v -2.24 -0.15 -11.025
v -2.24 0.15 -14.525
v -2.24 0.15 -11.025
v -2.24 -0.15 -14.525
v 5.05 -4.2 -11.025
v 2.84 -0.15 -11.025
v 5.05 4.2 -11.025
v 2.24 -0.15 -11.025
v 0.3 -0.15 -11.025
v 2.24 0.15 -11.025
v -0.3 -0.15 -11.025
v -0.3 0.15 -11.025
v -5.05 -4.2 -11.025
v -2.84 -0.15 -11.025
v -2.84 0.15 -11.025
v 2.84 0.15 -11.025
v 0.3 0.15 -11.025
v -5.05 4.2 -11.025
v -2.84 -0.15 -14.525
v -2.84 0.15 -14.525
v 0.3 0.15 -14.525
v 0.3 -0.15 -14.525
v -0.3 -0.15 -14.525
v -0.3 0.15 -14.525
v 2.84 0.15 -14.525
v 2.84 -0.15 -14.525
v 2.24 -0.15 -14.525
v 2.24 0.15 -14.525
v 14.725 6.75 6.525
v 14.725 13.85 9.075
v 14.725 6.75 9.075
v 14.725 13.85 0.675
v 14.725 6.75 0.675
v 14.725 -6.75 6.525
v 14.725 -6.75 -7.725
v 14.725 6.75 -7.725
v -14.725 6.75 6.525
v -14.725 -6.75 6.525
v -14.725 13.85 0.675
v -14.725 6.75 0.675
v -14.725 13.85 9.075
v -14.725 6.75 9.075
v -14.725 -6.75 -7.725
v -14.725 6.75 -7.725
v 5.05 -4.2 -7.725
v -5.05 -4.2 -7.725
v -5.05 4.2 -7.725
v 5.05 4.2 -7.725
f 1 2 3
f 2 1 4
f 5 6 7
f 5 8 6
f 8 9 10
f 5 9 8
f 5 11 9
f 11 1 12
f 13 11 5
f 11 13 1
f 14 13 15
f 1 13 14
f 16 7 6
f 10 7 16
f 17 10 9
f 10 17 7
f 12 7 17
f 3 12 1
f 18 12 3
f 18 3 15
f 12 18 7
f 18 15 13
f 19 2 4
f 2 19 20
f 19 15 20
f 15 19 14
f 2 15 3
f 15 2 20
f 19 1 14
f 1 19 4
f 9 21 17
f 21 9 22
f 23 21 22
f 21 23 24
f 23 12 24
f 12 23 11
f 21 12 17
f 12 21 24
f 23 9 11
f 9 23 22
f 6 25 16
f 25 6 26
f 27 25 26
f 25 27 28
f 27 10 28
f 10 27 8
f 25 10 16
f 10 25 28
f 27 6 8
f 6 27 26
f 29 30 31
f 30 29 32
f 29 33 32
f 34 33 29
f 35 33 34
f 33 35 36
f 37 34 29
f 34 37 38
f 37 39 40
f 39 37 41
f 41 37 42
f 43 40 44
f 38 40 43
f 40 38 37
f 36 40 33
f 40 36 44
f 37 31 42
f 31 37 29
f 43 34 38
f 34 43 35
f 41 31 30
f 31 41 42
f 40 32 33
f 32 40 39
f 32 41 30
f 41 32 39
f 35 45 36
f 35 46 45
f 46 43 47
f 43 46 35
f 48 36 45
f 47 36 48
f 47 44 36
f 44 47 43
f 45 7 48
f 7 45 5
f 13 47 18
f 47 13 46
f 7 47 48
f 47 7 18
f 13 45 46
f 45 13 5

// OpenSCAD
// Sharp GP2Y0D413K0F Distance Sensor - Outline Model
// Coordinate system: center of main body at origin, +Z up, +Y toward lens front
// Units: mm

// ─── Key dimensions from datasheet ───────────────────────────────────────────

// Main body (Carbonic ABS case)
body_w = 29.45;   // width  (X)  – overall width shown as 29.45
body_h = 13.05;   // height (Z)  – 13.05 shown on right side view
body_d = 13.5;    // depth  (Y)  – read from bottom view (~13.5 estimated)
// The drawing shows 18.9 as the total height including PWB protrusion area;
// 13.05 is the case body height, 1.2 is PWB thickness, (3.3) connector below.

// PWB (printed wiring board) – sits below the main body
pwb_w  = 29.45;   // same width as body
pwb_d  = 13.5;    // same depth as body
pwb_t  = 1.2;     // thickness  (Z)

// Connector (JCTC 12001W90-3P-HF) – 3-pin, below PWB
// Bottom view shows pin spacing area: 7.5 + 4.15 + ... = widths
// Connector body approx: width 10.1, depth ~8.4, height (3.3)
conn_w = 10.1;
conn_d = 8.4;
conn_h = 3.3;     // (reference)
pin_pitch = 2.54; // standard 2.54 mm pitch for 3 pins
pin_w  = 0.6;
pin_d  = 0.3;
pin_h  = 3.5;     // length protruding below connector

// Lens case protrusion on the front face (+Y)
// From front view: total width 29.45, lens case protrudes forward
// Lens case height: roughly 8.4 (from 8.4 dimension in side view)
// Lens case width: contains both lenses; *4.5 and *19.7 are lens center X positions
//   (measured from left edge of body, so left lens center at x=4.5, right at x=19.7)
// Lens case depth (protrusion): ~7.1 ± 0.1 (from side view dimension 7.1±0.1)
// Lens case vertical center: approximately at 7.2 from bottom of body (side view shows 7.2)
lens_case_w    = 29.45;  // spans full width
lens_case_h    = 8.4;    // height of lens case
lens_case_d    = 7.1;    // protrusion depth beyond front face
lens_case_z_bot = 7.2;   // bottom of lens case above body bottom

// Lens positions (center X from LEFT edge of body)
emitter_cx_from_left  = 4.5;   // *4.5
detector_cx_from_left = 19.7;  // *19.7

// Convert to body-centered X coordinates
// body left edge is at x = -body_w/2
emitter_cx  = -body_w/2 + emitter_cx_from_left;   // = -14.725 + 4.5  = -10.225
detector_cx = -body_w/2 + detector_cx_from_left;  // = -14.725 + 19.7 =  4.975

// Lens center Z (from body bottom)
lens_cz_from_bot = lens_case_z_bot + lens_case_h/2;  // approx middle of lens case

// Emitter lens: circular, diameter ~5.5 (estimated from drawing proportions)
emitter_lens_r = 2.75;

// Detector lens: rectangular window, approx 6.3 wide x 6.3 tall (6.3 from drawing)
detector_lens_w = 6.3;
detector_lens_h = 6.3;

// ─── Derived Z coordinates ────────────────────────────────────────────────────
// Layout from bottom up:
//   connector pins protrude below PWB
//   PWB bottom at z = -body_h/2 - pwb_t
//   body bottom at z = -body_h/2
//   body top    at z = +body_h/2

body_bot_z = -body_h / 2;
body_top_z =  body_h / 2;
pwb_bot_z  = body_bot_z - pwb_t;
conn_bot_z = pwb_bot_z  - conn_h;

lens_case_bot_z = body_bot_z + lens_case_z_bot;
lens_case_top_z = lens_case_bot_z + lens_case_h;
lens_cz = (lens_case_bot_z + lens_case_top_z) / 2;

// Front face of body is at y = +body_d/2
body_front_y = body_d / 2;
lens_case_front_y = body_front_y + lens_case_d;

// ─── Modules ──────────────────────────────────────────────────────────────────

module main_body() {
    color("DimGray")
    translate([0, 0, 0])
    cube([body_w, body_d, body_h], center=true);
}

module lens_case() {
    color("DarkGray") {
        // Lens case block – protrudes from front face
        translate([0,
                   body_front_y + lens_case_d/2,
                   lens_case_bot_z + lens_case_h/2])
            cube([lens_case_w, lens_case_d, lens_case_h], center=true);
    }
}

module emitter_lens() {
    // Circular lens window (light emitter, left side)
    color("Black")
    translate([emitter_cx,
               lens_case_front_y + 0.5,
               lens_cz])
        rotate([90, 0, 0])
            cylinder(r=emitter_lens_r, h=2, center=true, $fn=48);
}

module detector_lens() {
    // Rectangular lens window (light detector, right side)
    color("Black")
    translate([detector_cx,
               lens_case_front_y + 0.5,
               lens_cz])
        rotate([90, 0, 0])
            cube([detector_lens_w, detector_lens_h, 2], center=true);
}

module pwb() {
    color("SaddleBrown", 0.9)
    translate([0, 0, pwb_bot_z + pwb_t/2])
        cube([pwb_w, pwb_d, pwb_t], center=true);
}

module connector_body() {
    // Connector body – centered under the PWB, slightly offset toward front
    // From bottom view: connector is centered around x≈ +4 from body center (10.1 wide)
    // Position: roughly centered on the PWB
    color("Black")
    translate([0, 0, conn_bot_z + conn_h/2])
        cube([conn_w, conn_d, conn_h], center=true);
}

module connector_pins() {
    // 3 through-hole pins protruding downward
    pin_spacing = 2.54;
    color("Silver")
    for (i = [-1, 0, 1]) {
        translate([i * pin_spacing,
                   0,
                   conn_bot_z - pin_h/2])
            cube([pin_w, pin_d, pin_h], center=true);
    }
}

// ─── Assembly ─────────────────────────────────────────────────────────────────

union() {
    main_body();
    lens_case();

    // Subtract lens windows from lens case (difference)
    difference() {
        union() { } // nothing to add here; lenses subtracted below
    }

    pwb();
    connector_body();
    connector_pins();
}

// Lens case with cutouts for lenses
difference() {
    union() {
        // (already drawn above – redraw here as the base for subtraction)
    }
}

// Rebuild properly with difference for lens windows
module sensor_assembly() {
    // Main body
    main_body();

    // Lens case with lens apertures cut out
    difference() {
        lens_case();
        emitter_lens();
        detector_lens();
    }

    // PWB
    pwb();

    // Connector
    connector_body();
    connector_pins();
}

// ─── Render ───────────────────────────────────────────────────────────────────
sensor_assembly();
